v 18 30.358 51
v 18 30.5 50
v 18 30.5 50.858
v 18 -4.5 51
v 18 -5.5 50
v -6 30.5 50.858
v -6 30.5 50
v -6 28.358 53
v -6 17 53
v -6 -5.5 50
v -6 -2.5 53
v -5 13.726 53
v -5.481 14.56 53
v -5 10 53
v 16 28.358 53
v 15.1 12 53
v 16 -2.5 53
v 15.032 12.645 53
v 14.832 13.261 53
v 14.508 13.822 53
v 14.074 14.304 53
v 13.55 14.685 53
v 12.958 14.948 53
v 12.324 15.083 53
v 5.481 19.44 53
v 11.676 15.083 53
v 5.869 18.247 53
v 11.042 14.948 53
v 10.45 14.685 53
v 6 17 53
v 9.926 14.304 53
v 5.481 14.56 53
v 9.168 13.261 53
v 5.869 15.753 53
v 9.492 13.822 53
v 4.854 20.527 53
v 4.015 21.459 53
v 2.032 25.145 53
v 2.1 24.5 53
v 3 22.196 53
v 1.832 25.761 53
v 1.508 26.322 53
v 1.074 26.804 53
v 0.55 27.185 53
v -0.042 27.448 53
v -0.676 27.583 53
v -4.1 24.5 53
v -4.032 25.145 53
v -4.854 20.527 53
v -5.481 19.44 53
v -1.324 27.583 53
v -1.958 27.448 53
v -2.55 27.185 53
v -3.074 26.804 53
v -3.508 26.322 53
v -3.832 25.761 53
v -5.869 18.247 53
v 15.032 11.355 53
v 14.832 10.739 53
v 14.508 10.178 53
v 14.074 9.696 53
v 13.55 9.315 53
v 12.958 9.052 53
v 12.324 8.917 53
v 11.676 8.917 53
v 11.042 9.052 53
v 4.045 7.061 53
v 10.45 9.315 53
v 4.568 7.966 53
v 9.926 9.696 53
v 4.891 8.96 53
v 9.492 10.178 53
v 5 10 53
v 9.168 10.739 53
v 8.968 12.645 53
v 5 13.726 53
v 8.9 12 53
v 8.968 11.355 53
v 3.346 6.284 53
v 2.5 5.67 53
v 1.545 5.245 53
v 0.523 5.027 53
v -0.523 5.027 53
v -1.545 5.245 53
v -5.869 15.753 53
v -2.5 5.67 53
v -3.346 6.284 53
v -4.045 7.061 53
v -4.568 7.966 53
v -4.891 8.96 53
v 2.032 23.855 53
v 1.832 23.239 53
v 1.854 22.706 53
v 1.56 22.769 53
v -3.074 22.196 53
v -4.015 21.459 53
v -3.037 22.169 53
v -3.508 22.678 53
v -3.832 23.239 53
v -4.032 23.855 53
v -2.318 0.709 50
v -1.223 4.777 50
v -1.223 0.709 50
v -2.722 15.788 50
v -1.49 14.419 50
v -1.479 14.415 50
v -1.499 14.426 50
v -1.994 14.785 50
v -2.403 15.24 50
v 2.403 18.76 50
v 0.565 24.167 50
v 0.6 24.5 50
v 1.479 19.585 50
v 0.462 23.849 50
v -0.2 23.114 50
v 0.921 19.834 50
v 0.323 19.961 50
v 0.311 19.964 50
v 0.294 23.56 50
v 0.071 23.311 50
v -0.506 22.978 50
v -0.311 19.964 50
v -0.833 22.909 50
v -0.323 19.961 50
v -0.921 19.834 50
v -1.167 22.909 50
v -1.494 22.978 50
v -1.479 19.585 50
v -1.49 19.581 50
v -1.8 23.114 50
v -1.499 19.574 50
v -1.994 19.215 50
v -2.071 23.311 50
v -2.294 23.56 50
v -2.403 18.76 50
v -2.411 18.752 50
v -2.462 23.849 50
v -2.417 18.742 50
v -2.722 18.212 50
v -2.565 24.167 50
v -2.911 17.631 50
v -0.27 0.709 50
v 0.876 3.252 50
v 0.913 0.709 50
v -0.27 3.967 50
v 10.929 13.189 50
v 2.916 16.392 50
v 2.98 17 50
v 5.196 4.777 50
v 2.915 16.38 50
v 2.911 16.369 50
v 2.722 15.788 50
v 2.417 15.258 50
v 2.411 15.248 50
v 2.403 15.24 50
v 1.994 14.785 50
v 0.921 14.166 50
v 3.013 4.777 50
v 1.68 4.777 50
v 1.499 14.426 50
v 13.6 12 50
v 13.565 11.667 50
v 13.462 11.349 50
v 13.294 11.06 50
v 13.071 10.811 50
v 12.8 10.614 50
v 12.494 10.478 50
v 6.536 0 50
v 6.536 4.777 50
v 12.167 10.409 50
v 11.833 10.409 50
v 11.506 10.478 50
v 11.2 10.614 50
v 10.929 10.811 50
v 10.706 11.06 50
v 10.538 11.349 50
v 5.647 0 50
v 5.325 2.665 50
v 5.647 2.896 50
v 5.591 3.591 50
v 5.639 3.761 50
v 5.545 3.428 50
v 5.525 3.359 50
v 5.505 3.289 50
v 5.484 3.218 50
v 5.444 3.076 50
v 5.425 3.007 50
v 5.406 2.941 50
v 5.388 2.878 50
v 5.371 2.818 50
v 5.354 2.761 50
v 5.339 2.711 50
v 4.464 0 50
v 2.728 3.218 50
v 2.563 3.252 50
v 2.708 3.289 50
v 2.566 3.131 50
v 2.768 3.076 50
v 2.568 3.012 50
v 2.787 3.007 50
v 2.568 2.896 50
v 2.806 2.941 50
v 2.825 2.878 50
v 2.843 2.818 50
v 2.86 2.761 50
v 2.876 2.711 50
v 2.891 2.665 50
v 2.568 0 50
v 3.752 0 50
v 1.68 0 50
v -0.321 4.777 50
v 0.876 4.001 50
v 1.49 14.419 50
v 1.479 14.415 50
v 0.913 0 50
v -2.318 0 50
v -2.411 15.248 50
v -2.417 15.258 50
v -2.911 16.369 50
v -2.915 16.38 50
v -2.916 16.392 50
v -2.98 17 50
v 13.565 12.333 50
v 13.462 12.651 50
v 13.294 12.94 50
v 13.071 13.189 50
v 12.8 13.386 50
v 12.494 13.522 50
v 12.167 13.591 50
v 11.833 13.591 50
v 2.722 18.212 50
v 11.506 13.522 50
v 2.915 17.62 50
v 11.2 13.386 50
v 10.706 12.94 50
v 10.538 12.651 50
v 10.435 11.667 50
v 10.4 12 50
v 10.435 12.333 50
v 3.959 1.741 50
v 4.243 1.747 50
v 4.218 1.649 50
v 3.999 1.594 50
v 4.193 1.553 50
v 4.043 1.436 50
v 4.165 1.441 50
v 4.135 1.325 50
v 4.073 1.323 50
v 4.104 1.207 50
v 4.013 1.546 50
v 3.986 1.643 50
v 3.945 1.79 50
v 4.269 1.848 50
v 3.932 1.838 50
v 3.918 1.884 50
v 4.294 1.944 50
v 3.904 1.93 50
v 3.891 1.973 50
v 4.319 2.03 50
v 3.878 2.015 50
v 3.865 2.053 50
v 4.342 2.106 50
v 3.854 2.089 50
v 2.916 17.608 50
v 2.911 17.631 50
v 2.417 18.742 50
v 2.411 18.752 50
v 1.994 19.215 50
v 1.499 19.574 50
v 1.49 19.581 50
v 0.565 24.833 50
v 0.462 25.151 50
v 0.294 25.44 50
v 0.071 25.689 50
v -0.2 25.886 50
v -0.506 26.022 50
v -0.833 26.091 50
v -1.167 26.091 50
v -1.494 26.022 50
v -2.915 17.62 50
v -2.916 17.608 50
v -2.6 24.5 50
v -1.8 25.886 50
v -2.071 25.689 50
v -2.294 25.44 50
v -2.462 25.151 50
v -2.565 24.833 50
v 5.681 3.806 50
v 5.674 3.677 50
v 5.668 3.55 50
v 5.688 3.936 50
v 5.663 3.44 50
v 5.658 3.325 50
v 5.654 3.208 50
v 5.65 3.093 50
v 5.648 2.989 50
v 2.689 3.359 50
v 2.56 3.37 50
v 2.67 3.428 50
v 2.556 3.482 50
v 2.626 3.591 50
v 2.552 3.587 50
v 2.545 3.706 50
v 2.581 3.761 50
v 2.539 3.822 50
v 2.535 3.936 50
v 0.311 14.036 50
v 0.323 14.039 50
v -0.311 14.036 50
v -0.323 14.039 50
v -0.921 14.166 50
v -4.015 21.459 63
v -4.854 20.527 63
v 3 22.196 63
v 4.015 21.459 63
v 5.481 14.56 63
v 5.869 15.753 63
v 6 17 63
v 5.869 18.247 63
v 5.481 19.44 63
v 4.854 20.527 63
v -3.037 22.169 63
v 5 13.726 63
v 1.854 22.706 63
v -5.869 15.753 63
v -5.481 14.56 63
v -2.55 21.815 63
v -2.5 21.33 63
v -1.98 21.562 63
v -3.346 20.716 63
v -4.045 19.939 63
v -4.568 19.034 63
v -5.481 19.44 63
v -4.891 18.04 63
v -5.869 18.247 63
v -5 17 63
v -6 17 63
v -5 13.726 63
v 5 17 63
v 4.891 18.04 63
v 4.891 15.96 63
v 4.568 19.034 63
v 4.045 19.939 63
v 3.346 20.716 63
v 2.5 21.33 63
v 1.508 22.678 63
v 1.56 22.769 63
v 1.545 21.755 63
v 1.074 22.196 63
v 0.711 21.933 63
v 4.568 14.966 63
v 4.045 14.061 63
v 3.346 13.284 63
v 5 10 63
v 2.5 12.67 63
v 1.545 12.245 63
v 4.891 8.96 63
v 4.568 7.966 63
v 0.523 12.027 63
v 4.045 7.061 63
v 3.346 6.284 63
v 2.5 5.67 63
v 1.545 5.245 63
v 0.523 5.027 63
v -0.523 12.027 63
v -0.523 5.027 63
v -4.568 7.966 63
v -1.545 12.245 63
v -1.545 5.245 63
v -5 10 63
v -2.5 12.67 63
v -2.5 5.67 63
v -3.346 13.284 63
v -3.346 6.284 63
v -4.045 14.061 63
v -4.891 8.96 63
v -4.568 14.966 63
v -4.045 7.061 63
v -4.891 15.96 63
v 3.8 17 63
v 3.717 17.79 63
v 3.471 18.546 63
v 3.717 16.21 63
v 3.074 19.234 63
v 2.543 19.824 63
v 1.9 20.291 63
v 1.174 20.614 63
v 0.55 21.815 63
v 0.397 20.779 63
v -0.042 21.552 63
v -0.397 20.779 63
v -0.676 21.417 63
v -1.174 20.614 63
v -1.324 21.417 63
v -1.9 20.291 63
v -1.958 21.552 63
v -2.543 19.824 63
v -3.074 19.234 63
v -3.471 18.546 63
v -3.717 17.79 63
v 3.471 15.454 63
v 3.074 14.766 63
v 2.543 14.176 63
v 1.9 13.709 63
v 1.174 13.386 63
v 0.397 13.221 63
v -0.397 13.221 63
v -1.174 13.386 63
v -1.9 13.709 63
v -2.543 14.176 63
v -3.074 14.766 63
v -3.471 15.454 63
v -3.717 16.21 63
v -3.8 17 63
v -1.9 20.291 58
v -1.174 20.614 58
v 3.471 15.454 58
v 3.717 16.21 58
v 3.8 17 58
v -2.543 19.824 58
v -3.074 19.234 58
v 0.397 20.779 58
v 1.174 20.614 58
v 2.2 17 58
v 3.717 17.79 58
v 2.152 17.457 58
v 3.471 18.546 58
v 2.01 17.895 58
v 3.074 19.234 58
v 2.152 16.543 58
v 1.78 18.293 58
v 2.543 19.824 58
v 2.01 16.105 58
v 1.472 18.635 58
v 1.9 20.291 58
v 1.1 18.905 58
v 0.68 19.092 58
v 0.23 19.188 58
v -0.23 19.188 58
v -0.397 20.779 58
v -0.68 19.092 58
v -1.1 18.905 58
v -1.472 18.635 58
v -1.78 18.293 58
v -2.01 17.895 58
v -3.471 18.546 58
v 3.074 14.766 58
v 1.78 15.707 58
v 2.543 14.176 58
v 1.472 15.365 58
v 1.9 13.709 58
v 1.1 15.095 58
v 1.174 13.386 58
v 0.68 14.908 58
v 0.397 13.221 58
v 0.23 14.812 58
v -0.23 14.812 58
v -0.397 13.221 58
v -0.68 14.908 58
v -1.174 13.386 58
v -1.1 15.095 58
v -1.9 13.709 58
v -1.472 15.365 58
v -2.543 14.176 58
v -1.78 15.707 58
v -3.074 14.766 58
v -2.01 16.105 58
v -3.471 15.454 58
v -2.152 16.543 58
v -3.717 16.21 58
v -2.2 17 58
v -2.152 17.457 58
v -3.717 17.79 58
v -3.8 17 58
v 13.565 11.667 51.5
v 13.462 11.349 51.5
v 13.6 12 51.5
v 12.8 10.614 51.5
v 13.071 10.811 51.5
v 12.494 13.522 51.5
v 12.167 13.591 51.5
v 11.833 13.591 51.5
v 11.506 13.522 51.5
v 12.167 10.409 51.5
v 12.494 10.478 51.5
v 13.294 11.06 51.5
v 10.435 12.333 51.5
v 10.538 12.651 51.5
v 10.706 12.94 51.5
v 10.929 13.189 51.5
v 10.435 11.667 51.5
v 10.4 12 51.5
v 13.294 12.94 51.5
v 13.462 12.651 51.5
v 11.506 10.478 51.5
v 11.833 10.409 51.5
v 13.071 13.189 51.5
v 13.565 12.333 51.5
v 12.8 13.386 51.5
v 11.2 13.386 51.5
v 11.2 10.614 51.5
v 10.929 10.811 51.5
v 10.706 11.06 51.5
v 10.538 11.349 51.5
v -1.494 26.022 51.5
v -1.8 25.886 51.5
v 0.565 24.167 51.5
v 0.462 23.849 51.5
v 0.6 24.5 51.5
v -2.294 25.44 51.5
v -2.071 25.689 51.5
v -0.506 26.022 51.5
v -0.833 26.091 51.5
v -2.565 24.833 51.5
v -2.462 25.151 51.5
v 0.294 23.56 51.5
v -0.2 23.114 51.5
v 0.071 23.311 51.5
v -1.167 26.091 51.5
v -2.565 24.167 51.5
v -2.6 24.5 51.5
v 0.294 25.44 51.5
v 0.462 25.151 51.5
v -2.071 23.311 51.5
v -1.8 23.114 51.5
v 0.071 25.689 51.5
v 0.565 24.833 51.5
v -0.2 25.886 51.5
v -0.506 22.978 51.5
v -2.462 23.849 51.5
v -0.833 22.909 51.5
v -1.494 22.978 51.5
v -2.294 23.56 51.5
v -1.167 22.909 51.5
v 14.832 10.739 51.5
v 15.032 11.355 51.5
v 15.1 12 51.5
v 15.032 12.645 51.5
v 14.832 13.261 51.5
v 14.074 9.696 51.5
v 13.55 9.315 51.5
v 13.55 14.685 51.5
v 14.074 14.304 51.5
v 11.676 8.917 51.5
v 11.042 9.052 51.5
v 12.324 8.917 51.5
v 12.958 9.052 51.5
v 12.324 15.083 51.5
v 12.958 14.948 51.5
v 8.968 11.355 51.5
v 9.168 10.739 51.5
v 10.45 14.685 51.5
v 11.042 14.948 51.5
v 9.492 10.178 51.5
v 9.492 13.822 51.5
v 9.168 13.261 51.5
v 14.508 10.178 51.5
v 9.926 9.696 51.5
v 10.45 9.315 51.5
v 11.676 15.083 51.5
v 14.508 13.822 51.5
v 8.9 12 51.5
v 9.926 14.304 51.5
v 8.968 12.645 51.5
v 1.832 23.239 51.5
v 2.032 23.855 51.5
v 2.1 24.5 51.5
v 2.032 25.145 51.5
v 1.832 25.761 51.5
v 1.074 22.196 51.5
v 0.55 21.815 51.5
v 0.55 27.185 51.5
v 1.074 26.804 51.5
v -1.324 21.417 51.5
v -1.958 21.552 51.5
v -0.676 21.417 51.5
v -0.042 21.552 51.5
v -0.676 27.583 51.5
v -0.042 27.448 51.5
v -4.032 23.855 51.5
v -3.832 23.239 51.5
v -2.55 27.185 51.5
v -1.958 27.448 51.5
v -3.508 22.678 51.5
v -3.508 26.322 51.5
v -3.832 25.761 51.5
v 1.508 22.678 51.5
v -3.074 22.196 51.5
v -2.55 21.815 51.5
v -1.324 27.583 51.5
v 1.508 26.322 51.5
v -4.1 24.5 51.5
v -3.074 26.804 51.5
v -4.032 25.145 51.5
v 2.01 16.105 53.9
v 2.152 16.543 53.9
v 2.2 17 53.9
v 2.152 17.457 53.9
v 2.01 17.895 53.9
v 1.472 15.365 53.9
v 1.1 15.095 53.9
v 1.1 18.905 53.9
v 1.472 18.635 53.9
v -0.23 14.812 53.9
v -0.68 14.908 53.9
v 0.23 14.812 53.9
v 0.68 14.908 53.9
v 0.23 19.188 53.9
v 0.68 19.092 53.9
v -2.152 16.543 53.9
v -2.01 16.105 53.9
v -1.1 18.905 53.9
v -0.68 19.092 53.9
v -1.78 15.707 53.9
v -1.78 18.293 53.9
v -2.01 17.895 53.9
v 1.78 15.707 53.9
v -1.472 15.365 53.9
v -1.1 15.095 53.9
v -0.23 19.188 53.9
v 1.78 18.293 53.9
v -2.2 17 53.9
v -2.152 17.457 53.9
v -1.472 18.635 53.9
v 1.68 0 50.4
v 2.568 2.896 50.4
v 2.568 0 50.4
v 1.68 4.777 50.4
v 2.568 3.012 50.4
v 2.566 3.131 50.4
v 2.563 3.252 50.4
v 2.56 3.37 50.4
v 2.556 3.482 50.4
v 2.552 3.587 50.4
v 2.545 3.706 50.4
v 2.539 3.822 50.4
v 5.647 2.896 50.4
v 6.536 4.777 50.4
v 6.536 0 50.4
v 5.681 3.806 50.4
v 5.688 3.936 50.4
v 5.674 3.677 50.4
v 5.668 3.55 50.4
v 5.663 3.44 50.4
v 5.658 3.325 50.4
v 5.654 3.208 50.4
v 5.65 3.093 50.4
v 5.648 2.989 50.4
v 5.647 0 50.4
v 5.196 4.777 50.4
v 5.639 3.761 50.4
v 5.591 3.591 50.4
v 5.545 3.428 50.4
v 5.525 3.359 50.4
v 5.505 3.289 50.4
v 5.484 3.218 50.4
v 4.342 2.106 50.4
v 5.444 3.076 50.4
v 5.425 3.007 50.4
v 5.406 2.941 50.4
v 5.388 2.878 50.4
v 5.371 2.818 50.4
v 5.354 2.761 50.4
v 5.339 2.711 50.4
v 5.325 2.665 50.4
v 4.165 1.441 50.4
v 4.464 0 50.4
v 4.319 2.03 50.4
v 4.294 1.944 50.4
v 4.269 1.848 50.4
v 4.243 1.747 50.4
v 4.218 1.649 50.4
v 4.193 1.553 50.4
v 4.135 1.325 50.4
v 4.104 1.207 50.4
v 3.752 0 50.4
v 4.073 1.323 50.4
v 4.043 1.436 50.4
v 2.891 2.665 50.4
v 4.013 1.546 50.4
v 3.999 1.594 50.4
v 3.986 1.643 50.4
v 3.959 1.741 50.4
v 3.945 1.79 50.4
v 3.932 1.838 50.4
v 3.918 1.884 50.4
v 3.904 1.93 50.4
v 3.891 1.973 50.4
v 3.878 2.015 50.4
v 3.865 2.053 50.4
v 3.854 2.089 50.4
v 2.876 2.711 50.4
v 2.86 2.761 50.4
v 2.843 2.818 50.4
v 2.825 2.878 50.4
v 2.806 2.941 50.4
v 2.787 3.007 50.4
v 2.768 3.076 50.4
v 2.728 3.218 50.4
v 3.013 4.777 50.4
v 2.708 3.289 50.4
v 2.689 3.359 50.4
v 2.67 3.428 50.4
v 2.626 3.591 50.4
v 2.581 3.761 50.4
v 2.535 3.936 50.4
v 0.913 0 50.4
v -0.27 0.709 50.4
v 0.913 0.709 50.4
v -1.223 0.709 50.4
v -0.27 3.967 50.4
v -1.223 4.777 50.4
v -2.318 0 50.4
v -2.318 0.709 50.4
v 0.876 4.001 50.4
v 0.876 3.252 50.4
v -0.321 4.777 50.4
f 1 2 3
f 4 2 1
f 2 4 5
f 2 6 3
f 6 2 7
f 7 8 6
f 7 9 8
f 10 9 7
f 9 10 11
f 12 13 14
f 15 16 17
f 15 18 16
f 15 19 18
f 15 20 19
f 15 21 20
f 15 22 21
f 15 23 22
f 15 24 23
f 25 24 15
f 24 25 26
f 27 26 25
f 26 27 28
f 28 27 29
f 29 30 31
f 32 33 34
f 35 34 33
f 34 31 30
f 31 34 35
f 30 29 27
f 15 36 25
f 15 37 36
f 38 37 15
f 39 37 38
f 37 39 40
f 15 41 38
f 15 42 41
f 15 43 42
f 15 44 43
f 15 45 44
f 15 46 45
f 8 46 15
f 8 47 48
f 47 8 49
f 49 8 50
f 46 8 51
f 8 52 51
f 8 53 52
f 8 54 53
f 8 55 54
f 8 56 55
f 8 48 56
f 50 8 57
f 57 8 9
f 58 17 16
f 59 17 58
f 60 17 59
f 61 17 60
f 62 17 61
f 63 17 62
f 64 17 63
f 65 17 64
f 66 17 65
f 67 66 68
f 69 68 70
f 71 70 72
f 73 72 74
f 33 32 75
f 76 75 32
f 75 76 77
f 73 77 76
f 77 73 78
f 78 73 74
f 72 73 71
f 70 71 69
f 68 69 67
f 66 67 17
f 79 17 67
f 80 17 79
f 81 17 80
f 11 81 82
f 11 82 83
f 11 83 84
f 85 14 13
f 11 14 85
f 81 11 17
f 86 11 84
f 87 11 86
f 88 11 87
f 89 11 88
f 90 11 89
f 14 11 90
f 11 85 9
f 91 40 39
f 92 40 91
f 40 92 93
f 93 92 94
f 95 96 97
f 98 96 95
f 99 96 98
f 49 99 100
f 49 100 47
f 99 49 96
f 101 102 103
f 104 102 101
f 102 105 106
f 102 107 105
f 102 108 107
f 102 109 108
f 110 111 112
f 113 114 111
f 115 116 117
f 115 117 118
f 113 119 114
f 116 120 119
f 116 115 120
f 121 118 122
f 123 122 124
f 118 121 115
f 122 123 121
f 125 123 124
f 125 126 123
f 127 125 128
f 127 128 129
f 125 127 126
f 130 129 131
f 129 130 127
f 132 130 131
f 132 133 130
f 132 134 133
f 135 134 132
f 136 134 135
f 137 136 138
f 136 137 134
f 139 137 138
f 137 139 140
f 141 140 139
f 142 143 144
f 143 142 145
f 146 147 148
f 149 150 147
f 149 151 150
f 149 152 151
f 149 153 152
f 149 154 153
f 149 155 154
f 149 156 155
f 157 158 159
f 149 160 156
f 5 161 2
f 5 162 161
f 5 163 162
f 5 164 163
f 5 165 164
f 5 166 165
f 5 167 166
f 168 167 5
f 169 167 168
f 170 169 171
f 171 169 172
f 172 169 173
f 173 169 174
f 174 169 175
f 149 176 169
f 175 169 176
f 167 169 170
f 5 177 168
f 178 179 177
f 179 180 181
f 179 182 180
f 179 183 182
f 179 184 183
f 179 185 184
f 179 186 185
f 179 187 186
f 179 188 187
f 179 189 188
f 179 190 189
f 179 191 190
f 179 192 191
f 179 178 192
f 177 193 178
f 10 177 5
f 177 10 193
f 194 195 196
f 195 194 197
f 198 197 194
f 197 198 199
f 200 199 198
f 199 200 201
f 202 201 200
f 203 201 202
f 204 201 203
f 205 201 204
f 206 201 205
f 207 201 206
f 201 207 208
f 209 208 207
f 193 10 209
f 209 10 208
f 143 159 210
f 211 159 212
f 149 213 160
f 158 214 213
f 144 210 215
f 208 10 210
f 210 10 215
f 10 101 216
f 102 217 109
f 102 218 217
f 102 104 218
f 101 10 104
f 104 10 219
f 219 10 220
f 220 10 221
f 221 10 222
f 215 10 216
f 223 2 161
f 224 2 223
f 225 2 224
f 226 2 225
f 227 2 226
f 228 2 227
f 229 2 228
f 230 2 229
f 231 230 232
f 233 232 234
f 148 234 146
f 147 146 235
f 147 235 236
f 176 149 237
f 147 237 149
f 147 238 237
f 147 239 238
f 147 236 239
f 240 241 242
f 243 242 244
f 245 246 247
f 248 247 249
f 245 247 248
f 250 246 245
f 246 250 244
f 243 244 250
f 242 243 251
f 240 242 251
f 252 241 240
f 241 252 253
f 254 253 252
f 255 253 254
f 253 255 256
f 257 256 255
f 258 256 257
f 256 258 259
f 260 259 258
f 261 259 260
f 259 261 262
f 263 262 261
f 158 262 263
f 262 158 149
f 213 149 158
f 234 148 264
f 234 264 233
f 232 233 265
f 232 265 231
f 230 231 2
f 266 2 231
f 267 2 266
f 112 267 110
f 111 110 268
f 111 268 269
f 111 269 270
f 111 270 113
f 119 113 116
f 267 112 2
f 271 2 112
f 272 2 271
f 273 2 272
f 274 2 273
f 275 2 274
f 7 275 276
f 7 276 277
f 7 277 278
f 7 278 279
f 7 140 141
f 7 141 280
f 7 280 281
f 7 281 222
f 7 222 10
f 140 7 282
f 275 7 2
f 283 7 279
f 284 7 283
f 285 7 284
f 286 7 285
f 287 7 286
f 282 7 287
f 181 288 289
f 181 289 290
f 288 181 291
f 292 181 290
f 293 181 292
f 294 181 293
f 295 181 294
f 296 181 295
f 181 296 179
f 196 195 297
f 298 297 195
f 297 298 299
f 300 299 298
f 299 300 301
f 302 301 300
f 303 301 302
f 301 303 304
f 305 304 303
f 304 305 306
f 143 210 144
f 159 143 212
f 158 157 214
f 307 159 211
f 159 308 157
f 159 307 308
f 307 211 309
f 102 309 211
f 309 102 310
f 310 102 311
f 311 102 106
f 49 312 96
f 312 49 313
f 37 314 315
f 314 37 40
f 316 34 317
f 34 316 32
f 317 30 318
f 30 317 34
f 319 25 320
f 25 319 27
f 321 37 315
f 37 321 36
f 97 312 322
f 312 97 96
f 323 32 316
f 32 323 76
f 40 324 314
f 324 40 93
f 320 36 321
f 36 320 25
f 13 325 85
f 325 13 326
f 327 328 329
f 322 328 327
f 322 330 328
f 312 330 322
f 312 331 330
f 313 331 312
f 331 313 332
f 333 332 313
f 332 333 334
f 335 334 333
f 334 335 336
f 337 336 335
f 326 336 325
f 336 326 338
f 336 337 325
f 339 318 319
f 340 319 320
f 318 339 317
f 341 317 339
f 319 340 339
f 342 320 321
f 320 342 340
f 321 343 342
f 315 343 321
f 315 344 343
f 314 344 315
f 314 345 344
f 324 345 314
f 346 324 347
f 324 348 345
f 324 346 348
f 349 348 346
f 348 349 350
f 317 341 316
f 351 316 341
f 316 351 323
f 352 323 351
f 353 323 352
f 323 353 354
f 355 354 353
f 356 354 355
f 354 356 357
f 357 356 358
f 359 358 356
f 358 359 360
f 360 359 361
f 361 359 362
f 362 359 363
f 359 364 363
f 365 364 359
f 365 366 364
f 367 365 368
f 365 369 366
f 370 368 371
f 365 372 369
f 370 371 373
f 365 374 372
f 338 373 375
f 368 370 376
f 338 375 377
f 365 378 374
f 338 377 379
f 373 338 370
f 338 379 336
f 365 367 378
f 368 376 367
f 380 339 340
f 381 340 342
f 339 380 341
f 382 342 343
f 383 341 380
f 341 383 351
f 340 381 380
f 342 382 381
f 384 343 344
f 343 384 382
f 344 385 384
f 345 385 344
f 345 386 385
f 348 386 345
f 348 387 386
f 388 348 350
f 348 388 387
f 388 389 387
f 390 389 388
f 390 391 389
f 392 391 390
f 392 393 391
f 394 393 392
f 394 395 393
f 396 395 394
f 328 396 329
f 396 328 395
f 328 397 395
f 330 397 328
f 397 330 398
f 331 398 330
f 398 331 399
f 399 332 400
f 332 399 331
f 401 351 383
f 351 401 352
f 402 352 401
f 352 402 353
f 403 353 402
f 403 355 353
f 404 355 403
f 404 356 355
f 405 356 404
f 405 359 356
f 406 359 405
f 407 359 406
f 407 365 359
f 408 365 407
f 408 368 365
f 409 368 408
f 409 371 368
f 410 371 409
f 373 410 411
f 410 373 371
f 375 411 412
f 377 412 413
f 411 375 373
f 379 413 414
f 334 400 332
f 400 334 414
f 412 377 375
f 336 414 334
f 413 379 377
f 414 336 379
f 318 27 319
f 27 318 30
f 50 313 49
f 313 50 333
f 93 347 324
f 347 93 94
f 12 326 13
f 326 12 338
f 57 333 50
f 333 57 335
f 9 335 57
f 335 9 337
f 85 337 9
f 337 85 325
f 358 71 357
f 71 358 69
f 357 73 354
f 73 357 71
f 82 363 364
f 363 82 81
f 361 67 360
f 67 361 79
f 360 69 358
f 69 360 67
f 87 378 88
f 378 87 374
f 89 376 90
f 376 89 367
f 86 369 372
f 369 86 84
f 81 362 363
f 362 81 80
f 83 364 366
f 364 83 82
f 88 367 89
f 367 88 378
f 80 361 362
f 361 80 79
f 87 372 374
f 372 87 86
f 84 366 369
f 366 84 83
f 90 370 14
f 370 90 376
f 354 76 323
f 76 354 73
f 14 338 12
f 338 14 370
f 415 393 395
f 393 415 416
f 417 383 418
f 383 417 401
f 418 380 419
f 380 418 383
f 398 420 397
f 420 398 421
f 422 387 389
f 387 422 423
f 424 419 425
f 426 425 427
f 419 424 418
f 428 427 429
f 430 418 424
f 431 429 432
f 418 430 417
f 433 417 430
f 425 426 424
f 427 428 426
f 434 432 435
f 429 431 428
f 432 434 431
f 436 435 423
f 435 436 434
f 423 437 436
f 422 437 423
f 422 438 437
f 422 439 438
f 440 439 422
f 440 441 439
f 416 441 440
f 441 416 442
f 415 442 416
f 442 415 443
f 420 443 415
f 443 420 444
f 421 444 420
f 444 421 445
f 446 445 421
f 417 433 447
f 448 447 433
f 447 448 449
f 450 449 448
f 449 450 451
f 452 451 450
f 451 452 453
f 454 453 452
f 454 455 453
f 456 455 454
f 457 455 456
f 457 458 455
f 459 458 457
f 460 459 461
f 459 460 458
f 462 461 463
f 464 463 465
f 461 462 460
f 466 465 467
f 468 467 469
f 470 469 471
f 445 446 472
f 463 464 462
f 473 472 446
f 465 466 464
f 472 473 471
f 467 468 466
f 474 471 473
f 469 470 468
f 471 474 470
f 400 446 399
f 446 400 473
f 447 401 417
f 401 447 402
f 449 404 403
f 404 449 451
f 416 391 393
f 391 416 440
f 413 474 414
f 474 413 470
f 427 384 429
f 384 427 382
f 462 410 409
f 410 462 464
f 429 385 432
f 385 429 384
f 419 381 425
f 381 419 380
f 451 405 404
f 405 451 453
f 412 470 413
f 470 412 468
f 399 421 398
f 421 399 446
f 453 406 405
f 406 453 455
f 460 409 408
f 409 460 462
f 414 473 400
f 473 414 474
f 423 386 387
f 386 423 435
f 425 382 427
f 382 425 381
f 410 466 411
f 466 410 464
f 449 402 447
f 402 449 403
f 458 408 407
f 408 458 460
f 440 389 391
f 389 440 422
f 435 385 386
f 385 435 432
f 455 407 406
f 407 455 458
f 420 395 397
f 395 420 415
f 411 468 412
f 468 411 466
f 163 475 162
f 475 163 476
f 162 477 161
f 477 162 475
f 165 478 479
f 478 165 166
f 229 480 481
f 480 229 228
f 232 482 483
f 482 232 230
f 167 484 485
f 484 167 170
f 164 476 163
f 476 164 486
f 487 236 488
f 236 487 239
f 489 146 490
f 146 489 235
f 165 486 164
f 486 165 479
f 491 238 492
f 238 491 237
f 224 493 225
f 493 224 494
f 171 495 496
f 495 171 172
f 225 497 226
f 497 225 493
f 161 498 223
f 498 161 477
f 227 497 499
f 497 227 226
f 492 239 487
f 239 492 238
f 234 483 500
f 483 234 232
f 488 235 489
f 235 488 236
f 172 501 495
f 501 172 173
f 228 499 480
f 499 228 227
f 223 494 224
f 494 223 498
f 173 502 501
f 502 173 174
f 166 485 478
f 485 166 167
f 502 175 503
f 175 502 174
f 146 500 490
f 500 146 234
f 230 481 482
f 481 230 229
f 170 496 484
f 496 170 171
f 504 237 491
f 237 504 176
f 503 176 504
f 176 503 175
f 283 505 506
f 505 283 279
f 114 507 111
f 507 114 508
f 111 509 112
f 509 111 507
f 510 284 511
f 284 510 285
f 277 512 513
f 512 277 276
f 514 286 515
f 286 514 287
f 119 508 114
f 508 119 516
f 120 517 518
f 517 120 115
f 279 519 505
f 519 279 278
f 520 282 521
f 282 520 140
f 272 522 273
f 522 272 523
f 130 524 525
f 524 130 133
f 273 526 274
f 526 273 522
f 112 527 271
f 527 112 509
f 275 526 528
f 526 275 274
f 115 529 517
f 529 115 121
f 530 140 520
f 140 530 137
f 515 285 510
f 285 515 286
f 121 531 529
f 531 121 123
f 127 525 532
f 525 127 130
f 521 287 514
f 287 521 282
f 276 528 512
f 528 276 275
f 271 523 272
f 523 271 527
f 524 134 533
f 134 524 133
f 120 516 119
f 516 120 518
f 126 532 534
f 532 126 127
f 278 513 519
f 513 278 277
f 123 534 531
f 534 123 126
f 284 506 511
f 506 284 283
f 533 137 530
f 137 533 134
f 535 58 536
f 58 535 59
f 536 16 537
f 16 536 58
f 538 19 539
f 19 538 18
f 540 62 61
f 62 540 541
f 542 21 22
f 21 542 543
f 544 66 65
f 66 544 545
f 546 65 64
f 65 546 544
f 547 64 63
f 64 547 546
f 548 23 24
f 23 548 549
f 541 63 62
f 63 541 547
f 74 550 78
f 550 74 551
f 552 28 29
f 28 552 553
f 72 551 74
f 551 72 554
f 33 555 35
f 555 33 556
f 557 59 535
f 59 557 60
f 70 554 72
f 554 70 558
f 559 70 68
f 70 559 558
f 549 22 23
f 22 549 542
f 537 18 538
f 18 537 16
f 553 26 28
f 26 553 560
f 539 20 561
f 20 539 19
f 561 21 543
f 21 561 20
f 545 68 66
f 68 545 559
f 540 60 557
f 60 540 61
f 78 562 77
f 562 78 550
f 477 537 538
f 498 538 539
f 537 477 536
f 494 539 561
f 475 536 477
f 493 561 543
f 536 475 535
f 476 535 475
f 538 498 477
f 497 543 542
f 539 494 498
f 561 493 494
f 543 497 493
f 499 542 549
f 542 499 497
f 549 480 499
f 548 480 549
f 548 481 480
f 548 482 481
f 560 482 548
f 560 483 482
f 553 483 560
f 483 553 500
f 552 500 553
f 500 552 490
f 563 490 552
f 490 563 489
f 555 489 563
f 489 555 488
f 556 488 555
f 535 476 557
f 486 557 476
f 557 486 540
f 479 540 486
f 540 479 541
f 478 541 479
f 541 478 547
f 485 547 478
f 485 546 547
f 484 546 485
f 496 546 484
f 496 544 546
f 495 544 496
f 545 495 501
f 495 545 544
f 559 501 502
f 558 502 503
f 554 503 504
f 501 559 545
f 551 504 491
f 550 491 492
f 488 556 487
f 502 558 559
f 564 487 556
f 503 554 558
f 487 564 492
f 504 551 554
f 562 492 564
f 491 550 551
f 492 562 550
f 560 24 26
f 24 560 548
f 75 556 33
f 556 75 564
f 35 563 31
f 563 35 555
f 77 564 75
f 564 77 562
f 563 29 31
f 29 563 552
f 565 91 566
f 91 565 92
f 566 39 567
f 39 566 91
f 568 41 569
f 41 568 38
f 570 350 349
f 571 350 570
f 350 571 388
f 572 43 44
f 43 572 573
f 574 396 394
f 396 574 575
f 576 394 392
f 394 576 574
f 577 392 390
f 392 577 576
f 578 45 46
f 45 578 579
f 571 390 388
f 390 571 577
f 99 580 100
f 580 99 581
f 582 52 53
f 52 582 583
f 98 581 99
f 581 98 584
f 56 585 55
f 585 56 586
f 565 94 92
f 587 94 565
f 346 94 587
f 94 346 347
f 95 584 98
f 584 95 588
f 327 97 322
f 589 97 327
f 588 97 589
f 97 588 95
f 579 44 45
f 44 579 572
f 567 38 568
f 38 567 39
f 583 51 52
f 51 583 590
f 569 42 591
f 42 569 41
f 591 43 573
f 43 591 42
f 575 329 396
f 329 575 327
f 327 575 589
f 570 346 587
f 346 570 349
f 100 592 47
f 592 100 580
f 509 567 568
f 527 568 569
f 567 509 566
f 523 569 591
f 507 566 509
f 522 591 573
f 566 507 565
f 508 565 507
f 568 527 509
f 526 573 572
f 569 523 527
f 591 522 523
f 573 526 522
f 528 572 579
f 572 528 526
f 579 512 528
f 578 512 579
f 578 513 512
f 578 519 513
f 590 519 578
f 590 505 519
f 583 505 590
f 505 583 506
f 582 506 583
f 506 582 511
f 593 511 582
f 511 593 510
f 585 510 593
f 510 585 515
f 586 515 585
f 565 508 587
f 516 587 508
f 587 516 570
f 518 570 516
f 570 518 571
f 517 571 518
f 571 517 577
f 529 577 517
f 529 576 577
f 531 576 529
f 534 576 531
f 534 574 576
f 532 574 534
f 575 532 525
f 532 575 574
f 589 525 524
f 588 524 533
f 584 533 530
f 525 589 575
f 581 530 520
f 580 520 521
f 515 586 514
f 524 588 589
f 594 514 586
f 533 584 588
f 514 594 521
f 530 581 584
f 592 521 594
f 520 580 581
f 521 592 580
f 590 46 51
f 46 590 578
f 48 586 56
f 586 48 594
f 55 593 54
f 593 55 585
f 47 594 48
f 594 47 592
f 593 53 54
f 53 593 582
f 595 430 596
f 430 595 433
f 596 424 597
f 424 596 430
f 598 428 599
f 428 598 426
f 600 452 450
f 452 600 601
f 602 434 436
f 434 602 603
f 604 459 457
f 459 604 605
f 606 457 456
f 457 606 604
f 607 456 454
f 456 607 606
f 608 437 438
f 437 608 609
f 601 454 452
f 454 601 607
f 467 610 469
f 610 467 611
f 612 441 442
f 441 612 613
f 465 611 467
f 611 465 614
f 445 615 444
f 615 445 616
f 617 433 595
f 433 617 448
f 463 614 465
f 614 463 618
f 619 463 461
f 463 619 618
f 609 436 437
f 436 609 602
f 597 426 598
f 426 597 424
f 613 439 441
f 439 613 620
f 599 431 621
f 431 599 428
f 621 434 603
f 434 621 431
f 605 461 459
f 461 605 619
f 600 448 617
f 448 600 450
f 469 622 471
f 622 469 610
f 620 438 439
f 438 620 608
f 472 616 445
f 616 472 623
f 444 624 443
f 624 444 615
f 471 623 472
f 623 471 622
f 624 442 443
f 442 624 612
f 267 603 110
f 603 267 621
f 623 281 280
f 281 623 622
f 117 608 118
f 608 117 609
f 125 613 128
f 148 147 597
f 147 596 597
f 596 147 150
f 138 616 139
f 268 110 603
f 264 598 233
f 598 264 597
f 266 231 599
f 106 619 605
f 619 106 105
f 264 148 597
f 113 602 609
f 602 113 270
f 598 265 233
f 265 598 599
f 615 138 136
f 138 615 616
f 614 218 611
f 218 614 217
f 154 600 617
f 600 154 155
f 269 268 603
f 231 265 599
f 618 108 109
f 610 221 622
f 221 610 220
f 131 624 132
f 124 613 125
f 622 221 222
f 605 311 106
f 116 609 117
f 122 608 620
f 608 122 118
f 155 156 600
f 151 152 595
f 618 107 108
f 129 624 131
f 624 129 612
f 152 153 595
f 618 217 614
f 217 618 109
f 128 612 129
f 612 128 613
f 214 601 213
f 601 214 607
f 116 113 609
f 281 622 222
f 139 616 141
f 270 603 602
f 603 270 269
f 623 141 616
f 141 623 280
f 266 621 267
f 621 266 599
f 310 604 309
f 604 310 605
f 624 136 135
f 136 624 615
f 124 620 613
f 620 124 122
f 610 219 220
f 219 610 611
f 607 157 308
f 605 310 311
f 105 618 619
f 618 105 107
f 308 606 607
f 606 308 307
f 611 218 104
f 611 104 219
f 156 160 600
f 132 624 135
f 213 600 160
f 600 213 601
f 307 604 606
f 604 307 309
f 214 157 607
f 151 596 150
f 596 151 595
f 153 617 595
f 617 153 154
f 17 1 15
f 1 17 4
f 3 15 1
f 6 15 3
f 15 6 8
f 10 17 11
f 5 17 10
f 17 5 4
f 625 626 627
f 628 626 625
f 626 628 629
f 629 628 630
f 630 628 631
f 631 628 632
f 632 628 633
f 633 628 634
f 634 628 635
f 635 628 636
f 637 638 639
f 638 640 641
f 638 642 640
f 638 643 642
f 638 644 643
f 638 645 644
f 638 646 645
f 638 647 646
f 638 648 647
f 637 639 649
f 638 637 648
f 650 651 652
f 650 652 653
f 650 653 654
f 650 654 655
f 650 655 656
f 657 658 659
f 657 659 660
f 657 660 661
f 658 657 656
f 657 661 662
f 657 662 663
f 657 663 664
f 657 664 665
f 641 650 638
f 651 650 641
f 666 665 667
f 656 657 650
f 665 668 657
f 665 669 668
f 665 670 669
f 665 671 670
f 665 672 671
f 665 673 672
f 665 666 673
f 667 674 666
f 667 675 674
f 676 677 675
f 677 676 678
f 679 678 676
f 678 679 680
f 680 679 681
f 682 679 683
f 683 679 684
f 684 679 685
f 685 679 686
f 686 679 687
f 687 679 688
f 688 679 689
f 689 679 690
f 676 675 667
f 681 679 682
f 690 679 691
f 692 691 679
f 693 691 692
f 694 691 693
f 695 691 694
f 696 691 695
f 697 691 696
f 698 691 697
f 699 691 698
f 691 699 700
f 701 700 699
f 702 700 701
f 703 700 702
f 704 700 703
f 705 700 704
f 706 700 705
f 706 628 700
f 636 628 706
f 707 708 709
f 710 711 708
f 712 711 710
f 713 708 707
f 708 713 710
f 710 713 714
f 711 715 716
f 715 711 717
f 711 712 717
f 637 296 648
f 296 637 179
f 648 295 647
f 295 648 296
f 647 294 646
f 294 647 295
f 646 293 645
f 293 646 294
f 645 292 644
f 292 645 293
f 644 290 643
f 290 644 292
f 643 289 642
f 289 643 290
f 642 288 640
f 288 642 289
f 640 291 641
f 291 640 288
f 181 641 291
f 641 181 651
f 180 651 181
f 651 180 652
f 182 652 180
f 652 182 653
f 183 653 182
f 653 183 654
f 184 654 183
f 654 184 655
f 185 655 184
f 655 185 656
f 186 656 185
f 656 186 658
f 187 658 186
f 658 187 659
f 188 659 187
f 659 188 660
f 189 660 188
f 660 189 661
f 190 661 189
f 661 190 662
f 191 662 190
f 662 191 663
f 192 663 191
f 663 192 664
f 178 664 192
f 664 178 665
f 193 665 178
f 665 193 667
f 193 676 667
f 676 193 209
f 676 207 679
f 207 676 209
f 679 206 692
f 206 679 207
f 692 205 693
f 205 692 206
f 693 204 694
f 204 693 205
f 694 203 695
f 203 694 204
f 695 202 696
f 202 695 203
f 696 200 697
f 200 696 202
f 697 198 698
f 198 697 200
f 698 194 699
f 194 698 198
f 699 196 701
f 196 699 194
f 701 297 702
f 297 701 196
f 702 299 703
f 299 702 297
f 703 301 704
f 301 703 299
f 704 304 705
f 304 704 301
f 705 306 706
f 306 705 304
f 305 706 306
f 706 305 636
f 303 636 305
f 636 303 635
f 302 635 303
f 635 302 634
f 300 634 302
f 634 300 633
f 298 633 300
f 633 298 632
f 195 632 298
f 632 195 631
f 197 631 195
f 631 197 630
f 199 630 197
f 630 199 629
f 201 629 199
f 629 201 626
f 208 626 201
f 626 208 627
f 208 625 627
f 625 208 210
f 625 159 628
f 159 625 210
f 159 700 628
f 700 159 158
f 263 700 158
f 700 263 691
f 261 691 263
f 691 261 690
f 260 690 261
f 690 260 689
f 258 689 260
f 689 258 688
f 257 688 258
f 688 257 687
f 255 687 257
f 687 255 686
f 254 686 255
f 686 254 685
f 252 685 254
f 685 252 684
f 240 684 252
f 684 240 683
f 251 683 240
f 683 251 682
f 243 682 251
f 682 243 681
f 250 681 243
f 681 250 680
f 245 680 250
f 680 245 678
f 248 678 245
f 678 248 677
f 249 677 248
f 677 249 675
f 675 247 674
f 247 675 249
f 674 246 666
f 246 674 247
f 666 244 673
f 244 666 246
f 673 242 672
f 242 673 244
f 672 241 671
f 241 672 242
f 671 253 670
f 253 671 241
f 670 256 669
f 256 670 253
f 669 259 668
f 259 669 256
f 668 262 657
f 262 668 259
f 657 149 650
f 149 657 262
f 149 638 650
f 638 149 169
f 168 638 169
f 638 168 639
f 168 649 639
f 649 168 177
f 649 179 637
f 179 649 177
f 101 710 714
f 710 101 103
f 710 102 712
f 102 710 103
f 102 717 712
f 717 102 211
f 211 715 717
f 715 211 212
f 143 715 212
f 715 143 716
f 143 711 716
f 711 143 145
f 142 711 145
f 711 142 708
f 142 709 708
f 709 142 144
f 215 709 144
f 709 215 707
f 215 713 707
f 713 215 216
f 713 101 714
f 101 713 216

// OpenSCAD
// PRUSA iteration4
// Filament sensor cover
// GNU GPL v3
// Josef Průša <iam@josefprusa.cz> and contributors
// http://www.reprap.org/wiki/Prusa_Mendel
// http://prusamendel.org

module part()
{
    difference()
    {
        union()
            {   
                // base shape
                translate([-6,50,-30.5]) cube([24,3,36]);
                translate([0,63,-17]) rotate([90,0,0]) cylinder(r=6,h = 13, $fn=30); 
                translate([0,63,-10]) rotate([90,0,0]) cylinder(r=5,h = 13, $fn=30); 
                
                translate([-5,50,-17]) cube([10,13,7]);
              
            }
            
            // brass insert hole
            translate([0,63.5,-17]) rotate([90,0,0]) cylinder(r=3.8,h = 5.5, $fn=30); 
            translate([0,65,-17]) rotate([90,0,0]) cylinder(r=5,h = 2, $fn=30); 
            
            // mounting screws
            translate([12,60,-12]) rotate([90,0,0]) cylinder(r=1.6,h = 20, $fn=30); 
            translate([-1,60,-24.5]) rotate([90,0,0]) cylinder(r=1.6,h = 20, $fn=30); 
                
            translate([12,54.5,-12]) rotate([90,0,0]) cylinder(r=3.1,h = 3, $fn=30); 
            translate([-1,66.5,-24.5]) rotate([90,0,0]) cylinder(r=3.1,h = 15, $fn=30); 

            // filament guide
            translate([0,59.8,-17]) rotate([90,0,0]) cylinder(r=2.2,h = 9.8, $fn=30); 
            translate([0,61,-17]) rotate([90,0,0]) cylinder(r=1,h = 20, $fn=30);     
            translate([0,62.5,-17]) rotate([90,0,0]) cylinder(r2=1.2, r1=3,h = 3, $fn=30);     
            translate([0,53.9,-17]) rotate([90,0,0]) cylinder(r1=2.2, r2=3,h = 4, $fn=30);     
                
                
            // nice edges    
            translate([19,50,-40]) rotate([0,0,45]) cube([10,10,50]);
            translate([-8,56.5,-39]) rotate([45,0,0]) cube([50,10,10]);
            translate([-8,56.5,-1]) rotate([45,0,0]) cube([50,10,10]);


        translate([7,50.4,0]) rotate([90,180,0]) linear_extrude(height = 0.6) 
        { text("M1",font = "helvetica:style=Bold", size=5, center=true); }
    }
}


rotate([90,0,0]) 
part();
